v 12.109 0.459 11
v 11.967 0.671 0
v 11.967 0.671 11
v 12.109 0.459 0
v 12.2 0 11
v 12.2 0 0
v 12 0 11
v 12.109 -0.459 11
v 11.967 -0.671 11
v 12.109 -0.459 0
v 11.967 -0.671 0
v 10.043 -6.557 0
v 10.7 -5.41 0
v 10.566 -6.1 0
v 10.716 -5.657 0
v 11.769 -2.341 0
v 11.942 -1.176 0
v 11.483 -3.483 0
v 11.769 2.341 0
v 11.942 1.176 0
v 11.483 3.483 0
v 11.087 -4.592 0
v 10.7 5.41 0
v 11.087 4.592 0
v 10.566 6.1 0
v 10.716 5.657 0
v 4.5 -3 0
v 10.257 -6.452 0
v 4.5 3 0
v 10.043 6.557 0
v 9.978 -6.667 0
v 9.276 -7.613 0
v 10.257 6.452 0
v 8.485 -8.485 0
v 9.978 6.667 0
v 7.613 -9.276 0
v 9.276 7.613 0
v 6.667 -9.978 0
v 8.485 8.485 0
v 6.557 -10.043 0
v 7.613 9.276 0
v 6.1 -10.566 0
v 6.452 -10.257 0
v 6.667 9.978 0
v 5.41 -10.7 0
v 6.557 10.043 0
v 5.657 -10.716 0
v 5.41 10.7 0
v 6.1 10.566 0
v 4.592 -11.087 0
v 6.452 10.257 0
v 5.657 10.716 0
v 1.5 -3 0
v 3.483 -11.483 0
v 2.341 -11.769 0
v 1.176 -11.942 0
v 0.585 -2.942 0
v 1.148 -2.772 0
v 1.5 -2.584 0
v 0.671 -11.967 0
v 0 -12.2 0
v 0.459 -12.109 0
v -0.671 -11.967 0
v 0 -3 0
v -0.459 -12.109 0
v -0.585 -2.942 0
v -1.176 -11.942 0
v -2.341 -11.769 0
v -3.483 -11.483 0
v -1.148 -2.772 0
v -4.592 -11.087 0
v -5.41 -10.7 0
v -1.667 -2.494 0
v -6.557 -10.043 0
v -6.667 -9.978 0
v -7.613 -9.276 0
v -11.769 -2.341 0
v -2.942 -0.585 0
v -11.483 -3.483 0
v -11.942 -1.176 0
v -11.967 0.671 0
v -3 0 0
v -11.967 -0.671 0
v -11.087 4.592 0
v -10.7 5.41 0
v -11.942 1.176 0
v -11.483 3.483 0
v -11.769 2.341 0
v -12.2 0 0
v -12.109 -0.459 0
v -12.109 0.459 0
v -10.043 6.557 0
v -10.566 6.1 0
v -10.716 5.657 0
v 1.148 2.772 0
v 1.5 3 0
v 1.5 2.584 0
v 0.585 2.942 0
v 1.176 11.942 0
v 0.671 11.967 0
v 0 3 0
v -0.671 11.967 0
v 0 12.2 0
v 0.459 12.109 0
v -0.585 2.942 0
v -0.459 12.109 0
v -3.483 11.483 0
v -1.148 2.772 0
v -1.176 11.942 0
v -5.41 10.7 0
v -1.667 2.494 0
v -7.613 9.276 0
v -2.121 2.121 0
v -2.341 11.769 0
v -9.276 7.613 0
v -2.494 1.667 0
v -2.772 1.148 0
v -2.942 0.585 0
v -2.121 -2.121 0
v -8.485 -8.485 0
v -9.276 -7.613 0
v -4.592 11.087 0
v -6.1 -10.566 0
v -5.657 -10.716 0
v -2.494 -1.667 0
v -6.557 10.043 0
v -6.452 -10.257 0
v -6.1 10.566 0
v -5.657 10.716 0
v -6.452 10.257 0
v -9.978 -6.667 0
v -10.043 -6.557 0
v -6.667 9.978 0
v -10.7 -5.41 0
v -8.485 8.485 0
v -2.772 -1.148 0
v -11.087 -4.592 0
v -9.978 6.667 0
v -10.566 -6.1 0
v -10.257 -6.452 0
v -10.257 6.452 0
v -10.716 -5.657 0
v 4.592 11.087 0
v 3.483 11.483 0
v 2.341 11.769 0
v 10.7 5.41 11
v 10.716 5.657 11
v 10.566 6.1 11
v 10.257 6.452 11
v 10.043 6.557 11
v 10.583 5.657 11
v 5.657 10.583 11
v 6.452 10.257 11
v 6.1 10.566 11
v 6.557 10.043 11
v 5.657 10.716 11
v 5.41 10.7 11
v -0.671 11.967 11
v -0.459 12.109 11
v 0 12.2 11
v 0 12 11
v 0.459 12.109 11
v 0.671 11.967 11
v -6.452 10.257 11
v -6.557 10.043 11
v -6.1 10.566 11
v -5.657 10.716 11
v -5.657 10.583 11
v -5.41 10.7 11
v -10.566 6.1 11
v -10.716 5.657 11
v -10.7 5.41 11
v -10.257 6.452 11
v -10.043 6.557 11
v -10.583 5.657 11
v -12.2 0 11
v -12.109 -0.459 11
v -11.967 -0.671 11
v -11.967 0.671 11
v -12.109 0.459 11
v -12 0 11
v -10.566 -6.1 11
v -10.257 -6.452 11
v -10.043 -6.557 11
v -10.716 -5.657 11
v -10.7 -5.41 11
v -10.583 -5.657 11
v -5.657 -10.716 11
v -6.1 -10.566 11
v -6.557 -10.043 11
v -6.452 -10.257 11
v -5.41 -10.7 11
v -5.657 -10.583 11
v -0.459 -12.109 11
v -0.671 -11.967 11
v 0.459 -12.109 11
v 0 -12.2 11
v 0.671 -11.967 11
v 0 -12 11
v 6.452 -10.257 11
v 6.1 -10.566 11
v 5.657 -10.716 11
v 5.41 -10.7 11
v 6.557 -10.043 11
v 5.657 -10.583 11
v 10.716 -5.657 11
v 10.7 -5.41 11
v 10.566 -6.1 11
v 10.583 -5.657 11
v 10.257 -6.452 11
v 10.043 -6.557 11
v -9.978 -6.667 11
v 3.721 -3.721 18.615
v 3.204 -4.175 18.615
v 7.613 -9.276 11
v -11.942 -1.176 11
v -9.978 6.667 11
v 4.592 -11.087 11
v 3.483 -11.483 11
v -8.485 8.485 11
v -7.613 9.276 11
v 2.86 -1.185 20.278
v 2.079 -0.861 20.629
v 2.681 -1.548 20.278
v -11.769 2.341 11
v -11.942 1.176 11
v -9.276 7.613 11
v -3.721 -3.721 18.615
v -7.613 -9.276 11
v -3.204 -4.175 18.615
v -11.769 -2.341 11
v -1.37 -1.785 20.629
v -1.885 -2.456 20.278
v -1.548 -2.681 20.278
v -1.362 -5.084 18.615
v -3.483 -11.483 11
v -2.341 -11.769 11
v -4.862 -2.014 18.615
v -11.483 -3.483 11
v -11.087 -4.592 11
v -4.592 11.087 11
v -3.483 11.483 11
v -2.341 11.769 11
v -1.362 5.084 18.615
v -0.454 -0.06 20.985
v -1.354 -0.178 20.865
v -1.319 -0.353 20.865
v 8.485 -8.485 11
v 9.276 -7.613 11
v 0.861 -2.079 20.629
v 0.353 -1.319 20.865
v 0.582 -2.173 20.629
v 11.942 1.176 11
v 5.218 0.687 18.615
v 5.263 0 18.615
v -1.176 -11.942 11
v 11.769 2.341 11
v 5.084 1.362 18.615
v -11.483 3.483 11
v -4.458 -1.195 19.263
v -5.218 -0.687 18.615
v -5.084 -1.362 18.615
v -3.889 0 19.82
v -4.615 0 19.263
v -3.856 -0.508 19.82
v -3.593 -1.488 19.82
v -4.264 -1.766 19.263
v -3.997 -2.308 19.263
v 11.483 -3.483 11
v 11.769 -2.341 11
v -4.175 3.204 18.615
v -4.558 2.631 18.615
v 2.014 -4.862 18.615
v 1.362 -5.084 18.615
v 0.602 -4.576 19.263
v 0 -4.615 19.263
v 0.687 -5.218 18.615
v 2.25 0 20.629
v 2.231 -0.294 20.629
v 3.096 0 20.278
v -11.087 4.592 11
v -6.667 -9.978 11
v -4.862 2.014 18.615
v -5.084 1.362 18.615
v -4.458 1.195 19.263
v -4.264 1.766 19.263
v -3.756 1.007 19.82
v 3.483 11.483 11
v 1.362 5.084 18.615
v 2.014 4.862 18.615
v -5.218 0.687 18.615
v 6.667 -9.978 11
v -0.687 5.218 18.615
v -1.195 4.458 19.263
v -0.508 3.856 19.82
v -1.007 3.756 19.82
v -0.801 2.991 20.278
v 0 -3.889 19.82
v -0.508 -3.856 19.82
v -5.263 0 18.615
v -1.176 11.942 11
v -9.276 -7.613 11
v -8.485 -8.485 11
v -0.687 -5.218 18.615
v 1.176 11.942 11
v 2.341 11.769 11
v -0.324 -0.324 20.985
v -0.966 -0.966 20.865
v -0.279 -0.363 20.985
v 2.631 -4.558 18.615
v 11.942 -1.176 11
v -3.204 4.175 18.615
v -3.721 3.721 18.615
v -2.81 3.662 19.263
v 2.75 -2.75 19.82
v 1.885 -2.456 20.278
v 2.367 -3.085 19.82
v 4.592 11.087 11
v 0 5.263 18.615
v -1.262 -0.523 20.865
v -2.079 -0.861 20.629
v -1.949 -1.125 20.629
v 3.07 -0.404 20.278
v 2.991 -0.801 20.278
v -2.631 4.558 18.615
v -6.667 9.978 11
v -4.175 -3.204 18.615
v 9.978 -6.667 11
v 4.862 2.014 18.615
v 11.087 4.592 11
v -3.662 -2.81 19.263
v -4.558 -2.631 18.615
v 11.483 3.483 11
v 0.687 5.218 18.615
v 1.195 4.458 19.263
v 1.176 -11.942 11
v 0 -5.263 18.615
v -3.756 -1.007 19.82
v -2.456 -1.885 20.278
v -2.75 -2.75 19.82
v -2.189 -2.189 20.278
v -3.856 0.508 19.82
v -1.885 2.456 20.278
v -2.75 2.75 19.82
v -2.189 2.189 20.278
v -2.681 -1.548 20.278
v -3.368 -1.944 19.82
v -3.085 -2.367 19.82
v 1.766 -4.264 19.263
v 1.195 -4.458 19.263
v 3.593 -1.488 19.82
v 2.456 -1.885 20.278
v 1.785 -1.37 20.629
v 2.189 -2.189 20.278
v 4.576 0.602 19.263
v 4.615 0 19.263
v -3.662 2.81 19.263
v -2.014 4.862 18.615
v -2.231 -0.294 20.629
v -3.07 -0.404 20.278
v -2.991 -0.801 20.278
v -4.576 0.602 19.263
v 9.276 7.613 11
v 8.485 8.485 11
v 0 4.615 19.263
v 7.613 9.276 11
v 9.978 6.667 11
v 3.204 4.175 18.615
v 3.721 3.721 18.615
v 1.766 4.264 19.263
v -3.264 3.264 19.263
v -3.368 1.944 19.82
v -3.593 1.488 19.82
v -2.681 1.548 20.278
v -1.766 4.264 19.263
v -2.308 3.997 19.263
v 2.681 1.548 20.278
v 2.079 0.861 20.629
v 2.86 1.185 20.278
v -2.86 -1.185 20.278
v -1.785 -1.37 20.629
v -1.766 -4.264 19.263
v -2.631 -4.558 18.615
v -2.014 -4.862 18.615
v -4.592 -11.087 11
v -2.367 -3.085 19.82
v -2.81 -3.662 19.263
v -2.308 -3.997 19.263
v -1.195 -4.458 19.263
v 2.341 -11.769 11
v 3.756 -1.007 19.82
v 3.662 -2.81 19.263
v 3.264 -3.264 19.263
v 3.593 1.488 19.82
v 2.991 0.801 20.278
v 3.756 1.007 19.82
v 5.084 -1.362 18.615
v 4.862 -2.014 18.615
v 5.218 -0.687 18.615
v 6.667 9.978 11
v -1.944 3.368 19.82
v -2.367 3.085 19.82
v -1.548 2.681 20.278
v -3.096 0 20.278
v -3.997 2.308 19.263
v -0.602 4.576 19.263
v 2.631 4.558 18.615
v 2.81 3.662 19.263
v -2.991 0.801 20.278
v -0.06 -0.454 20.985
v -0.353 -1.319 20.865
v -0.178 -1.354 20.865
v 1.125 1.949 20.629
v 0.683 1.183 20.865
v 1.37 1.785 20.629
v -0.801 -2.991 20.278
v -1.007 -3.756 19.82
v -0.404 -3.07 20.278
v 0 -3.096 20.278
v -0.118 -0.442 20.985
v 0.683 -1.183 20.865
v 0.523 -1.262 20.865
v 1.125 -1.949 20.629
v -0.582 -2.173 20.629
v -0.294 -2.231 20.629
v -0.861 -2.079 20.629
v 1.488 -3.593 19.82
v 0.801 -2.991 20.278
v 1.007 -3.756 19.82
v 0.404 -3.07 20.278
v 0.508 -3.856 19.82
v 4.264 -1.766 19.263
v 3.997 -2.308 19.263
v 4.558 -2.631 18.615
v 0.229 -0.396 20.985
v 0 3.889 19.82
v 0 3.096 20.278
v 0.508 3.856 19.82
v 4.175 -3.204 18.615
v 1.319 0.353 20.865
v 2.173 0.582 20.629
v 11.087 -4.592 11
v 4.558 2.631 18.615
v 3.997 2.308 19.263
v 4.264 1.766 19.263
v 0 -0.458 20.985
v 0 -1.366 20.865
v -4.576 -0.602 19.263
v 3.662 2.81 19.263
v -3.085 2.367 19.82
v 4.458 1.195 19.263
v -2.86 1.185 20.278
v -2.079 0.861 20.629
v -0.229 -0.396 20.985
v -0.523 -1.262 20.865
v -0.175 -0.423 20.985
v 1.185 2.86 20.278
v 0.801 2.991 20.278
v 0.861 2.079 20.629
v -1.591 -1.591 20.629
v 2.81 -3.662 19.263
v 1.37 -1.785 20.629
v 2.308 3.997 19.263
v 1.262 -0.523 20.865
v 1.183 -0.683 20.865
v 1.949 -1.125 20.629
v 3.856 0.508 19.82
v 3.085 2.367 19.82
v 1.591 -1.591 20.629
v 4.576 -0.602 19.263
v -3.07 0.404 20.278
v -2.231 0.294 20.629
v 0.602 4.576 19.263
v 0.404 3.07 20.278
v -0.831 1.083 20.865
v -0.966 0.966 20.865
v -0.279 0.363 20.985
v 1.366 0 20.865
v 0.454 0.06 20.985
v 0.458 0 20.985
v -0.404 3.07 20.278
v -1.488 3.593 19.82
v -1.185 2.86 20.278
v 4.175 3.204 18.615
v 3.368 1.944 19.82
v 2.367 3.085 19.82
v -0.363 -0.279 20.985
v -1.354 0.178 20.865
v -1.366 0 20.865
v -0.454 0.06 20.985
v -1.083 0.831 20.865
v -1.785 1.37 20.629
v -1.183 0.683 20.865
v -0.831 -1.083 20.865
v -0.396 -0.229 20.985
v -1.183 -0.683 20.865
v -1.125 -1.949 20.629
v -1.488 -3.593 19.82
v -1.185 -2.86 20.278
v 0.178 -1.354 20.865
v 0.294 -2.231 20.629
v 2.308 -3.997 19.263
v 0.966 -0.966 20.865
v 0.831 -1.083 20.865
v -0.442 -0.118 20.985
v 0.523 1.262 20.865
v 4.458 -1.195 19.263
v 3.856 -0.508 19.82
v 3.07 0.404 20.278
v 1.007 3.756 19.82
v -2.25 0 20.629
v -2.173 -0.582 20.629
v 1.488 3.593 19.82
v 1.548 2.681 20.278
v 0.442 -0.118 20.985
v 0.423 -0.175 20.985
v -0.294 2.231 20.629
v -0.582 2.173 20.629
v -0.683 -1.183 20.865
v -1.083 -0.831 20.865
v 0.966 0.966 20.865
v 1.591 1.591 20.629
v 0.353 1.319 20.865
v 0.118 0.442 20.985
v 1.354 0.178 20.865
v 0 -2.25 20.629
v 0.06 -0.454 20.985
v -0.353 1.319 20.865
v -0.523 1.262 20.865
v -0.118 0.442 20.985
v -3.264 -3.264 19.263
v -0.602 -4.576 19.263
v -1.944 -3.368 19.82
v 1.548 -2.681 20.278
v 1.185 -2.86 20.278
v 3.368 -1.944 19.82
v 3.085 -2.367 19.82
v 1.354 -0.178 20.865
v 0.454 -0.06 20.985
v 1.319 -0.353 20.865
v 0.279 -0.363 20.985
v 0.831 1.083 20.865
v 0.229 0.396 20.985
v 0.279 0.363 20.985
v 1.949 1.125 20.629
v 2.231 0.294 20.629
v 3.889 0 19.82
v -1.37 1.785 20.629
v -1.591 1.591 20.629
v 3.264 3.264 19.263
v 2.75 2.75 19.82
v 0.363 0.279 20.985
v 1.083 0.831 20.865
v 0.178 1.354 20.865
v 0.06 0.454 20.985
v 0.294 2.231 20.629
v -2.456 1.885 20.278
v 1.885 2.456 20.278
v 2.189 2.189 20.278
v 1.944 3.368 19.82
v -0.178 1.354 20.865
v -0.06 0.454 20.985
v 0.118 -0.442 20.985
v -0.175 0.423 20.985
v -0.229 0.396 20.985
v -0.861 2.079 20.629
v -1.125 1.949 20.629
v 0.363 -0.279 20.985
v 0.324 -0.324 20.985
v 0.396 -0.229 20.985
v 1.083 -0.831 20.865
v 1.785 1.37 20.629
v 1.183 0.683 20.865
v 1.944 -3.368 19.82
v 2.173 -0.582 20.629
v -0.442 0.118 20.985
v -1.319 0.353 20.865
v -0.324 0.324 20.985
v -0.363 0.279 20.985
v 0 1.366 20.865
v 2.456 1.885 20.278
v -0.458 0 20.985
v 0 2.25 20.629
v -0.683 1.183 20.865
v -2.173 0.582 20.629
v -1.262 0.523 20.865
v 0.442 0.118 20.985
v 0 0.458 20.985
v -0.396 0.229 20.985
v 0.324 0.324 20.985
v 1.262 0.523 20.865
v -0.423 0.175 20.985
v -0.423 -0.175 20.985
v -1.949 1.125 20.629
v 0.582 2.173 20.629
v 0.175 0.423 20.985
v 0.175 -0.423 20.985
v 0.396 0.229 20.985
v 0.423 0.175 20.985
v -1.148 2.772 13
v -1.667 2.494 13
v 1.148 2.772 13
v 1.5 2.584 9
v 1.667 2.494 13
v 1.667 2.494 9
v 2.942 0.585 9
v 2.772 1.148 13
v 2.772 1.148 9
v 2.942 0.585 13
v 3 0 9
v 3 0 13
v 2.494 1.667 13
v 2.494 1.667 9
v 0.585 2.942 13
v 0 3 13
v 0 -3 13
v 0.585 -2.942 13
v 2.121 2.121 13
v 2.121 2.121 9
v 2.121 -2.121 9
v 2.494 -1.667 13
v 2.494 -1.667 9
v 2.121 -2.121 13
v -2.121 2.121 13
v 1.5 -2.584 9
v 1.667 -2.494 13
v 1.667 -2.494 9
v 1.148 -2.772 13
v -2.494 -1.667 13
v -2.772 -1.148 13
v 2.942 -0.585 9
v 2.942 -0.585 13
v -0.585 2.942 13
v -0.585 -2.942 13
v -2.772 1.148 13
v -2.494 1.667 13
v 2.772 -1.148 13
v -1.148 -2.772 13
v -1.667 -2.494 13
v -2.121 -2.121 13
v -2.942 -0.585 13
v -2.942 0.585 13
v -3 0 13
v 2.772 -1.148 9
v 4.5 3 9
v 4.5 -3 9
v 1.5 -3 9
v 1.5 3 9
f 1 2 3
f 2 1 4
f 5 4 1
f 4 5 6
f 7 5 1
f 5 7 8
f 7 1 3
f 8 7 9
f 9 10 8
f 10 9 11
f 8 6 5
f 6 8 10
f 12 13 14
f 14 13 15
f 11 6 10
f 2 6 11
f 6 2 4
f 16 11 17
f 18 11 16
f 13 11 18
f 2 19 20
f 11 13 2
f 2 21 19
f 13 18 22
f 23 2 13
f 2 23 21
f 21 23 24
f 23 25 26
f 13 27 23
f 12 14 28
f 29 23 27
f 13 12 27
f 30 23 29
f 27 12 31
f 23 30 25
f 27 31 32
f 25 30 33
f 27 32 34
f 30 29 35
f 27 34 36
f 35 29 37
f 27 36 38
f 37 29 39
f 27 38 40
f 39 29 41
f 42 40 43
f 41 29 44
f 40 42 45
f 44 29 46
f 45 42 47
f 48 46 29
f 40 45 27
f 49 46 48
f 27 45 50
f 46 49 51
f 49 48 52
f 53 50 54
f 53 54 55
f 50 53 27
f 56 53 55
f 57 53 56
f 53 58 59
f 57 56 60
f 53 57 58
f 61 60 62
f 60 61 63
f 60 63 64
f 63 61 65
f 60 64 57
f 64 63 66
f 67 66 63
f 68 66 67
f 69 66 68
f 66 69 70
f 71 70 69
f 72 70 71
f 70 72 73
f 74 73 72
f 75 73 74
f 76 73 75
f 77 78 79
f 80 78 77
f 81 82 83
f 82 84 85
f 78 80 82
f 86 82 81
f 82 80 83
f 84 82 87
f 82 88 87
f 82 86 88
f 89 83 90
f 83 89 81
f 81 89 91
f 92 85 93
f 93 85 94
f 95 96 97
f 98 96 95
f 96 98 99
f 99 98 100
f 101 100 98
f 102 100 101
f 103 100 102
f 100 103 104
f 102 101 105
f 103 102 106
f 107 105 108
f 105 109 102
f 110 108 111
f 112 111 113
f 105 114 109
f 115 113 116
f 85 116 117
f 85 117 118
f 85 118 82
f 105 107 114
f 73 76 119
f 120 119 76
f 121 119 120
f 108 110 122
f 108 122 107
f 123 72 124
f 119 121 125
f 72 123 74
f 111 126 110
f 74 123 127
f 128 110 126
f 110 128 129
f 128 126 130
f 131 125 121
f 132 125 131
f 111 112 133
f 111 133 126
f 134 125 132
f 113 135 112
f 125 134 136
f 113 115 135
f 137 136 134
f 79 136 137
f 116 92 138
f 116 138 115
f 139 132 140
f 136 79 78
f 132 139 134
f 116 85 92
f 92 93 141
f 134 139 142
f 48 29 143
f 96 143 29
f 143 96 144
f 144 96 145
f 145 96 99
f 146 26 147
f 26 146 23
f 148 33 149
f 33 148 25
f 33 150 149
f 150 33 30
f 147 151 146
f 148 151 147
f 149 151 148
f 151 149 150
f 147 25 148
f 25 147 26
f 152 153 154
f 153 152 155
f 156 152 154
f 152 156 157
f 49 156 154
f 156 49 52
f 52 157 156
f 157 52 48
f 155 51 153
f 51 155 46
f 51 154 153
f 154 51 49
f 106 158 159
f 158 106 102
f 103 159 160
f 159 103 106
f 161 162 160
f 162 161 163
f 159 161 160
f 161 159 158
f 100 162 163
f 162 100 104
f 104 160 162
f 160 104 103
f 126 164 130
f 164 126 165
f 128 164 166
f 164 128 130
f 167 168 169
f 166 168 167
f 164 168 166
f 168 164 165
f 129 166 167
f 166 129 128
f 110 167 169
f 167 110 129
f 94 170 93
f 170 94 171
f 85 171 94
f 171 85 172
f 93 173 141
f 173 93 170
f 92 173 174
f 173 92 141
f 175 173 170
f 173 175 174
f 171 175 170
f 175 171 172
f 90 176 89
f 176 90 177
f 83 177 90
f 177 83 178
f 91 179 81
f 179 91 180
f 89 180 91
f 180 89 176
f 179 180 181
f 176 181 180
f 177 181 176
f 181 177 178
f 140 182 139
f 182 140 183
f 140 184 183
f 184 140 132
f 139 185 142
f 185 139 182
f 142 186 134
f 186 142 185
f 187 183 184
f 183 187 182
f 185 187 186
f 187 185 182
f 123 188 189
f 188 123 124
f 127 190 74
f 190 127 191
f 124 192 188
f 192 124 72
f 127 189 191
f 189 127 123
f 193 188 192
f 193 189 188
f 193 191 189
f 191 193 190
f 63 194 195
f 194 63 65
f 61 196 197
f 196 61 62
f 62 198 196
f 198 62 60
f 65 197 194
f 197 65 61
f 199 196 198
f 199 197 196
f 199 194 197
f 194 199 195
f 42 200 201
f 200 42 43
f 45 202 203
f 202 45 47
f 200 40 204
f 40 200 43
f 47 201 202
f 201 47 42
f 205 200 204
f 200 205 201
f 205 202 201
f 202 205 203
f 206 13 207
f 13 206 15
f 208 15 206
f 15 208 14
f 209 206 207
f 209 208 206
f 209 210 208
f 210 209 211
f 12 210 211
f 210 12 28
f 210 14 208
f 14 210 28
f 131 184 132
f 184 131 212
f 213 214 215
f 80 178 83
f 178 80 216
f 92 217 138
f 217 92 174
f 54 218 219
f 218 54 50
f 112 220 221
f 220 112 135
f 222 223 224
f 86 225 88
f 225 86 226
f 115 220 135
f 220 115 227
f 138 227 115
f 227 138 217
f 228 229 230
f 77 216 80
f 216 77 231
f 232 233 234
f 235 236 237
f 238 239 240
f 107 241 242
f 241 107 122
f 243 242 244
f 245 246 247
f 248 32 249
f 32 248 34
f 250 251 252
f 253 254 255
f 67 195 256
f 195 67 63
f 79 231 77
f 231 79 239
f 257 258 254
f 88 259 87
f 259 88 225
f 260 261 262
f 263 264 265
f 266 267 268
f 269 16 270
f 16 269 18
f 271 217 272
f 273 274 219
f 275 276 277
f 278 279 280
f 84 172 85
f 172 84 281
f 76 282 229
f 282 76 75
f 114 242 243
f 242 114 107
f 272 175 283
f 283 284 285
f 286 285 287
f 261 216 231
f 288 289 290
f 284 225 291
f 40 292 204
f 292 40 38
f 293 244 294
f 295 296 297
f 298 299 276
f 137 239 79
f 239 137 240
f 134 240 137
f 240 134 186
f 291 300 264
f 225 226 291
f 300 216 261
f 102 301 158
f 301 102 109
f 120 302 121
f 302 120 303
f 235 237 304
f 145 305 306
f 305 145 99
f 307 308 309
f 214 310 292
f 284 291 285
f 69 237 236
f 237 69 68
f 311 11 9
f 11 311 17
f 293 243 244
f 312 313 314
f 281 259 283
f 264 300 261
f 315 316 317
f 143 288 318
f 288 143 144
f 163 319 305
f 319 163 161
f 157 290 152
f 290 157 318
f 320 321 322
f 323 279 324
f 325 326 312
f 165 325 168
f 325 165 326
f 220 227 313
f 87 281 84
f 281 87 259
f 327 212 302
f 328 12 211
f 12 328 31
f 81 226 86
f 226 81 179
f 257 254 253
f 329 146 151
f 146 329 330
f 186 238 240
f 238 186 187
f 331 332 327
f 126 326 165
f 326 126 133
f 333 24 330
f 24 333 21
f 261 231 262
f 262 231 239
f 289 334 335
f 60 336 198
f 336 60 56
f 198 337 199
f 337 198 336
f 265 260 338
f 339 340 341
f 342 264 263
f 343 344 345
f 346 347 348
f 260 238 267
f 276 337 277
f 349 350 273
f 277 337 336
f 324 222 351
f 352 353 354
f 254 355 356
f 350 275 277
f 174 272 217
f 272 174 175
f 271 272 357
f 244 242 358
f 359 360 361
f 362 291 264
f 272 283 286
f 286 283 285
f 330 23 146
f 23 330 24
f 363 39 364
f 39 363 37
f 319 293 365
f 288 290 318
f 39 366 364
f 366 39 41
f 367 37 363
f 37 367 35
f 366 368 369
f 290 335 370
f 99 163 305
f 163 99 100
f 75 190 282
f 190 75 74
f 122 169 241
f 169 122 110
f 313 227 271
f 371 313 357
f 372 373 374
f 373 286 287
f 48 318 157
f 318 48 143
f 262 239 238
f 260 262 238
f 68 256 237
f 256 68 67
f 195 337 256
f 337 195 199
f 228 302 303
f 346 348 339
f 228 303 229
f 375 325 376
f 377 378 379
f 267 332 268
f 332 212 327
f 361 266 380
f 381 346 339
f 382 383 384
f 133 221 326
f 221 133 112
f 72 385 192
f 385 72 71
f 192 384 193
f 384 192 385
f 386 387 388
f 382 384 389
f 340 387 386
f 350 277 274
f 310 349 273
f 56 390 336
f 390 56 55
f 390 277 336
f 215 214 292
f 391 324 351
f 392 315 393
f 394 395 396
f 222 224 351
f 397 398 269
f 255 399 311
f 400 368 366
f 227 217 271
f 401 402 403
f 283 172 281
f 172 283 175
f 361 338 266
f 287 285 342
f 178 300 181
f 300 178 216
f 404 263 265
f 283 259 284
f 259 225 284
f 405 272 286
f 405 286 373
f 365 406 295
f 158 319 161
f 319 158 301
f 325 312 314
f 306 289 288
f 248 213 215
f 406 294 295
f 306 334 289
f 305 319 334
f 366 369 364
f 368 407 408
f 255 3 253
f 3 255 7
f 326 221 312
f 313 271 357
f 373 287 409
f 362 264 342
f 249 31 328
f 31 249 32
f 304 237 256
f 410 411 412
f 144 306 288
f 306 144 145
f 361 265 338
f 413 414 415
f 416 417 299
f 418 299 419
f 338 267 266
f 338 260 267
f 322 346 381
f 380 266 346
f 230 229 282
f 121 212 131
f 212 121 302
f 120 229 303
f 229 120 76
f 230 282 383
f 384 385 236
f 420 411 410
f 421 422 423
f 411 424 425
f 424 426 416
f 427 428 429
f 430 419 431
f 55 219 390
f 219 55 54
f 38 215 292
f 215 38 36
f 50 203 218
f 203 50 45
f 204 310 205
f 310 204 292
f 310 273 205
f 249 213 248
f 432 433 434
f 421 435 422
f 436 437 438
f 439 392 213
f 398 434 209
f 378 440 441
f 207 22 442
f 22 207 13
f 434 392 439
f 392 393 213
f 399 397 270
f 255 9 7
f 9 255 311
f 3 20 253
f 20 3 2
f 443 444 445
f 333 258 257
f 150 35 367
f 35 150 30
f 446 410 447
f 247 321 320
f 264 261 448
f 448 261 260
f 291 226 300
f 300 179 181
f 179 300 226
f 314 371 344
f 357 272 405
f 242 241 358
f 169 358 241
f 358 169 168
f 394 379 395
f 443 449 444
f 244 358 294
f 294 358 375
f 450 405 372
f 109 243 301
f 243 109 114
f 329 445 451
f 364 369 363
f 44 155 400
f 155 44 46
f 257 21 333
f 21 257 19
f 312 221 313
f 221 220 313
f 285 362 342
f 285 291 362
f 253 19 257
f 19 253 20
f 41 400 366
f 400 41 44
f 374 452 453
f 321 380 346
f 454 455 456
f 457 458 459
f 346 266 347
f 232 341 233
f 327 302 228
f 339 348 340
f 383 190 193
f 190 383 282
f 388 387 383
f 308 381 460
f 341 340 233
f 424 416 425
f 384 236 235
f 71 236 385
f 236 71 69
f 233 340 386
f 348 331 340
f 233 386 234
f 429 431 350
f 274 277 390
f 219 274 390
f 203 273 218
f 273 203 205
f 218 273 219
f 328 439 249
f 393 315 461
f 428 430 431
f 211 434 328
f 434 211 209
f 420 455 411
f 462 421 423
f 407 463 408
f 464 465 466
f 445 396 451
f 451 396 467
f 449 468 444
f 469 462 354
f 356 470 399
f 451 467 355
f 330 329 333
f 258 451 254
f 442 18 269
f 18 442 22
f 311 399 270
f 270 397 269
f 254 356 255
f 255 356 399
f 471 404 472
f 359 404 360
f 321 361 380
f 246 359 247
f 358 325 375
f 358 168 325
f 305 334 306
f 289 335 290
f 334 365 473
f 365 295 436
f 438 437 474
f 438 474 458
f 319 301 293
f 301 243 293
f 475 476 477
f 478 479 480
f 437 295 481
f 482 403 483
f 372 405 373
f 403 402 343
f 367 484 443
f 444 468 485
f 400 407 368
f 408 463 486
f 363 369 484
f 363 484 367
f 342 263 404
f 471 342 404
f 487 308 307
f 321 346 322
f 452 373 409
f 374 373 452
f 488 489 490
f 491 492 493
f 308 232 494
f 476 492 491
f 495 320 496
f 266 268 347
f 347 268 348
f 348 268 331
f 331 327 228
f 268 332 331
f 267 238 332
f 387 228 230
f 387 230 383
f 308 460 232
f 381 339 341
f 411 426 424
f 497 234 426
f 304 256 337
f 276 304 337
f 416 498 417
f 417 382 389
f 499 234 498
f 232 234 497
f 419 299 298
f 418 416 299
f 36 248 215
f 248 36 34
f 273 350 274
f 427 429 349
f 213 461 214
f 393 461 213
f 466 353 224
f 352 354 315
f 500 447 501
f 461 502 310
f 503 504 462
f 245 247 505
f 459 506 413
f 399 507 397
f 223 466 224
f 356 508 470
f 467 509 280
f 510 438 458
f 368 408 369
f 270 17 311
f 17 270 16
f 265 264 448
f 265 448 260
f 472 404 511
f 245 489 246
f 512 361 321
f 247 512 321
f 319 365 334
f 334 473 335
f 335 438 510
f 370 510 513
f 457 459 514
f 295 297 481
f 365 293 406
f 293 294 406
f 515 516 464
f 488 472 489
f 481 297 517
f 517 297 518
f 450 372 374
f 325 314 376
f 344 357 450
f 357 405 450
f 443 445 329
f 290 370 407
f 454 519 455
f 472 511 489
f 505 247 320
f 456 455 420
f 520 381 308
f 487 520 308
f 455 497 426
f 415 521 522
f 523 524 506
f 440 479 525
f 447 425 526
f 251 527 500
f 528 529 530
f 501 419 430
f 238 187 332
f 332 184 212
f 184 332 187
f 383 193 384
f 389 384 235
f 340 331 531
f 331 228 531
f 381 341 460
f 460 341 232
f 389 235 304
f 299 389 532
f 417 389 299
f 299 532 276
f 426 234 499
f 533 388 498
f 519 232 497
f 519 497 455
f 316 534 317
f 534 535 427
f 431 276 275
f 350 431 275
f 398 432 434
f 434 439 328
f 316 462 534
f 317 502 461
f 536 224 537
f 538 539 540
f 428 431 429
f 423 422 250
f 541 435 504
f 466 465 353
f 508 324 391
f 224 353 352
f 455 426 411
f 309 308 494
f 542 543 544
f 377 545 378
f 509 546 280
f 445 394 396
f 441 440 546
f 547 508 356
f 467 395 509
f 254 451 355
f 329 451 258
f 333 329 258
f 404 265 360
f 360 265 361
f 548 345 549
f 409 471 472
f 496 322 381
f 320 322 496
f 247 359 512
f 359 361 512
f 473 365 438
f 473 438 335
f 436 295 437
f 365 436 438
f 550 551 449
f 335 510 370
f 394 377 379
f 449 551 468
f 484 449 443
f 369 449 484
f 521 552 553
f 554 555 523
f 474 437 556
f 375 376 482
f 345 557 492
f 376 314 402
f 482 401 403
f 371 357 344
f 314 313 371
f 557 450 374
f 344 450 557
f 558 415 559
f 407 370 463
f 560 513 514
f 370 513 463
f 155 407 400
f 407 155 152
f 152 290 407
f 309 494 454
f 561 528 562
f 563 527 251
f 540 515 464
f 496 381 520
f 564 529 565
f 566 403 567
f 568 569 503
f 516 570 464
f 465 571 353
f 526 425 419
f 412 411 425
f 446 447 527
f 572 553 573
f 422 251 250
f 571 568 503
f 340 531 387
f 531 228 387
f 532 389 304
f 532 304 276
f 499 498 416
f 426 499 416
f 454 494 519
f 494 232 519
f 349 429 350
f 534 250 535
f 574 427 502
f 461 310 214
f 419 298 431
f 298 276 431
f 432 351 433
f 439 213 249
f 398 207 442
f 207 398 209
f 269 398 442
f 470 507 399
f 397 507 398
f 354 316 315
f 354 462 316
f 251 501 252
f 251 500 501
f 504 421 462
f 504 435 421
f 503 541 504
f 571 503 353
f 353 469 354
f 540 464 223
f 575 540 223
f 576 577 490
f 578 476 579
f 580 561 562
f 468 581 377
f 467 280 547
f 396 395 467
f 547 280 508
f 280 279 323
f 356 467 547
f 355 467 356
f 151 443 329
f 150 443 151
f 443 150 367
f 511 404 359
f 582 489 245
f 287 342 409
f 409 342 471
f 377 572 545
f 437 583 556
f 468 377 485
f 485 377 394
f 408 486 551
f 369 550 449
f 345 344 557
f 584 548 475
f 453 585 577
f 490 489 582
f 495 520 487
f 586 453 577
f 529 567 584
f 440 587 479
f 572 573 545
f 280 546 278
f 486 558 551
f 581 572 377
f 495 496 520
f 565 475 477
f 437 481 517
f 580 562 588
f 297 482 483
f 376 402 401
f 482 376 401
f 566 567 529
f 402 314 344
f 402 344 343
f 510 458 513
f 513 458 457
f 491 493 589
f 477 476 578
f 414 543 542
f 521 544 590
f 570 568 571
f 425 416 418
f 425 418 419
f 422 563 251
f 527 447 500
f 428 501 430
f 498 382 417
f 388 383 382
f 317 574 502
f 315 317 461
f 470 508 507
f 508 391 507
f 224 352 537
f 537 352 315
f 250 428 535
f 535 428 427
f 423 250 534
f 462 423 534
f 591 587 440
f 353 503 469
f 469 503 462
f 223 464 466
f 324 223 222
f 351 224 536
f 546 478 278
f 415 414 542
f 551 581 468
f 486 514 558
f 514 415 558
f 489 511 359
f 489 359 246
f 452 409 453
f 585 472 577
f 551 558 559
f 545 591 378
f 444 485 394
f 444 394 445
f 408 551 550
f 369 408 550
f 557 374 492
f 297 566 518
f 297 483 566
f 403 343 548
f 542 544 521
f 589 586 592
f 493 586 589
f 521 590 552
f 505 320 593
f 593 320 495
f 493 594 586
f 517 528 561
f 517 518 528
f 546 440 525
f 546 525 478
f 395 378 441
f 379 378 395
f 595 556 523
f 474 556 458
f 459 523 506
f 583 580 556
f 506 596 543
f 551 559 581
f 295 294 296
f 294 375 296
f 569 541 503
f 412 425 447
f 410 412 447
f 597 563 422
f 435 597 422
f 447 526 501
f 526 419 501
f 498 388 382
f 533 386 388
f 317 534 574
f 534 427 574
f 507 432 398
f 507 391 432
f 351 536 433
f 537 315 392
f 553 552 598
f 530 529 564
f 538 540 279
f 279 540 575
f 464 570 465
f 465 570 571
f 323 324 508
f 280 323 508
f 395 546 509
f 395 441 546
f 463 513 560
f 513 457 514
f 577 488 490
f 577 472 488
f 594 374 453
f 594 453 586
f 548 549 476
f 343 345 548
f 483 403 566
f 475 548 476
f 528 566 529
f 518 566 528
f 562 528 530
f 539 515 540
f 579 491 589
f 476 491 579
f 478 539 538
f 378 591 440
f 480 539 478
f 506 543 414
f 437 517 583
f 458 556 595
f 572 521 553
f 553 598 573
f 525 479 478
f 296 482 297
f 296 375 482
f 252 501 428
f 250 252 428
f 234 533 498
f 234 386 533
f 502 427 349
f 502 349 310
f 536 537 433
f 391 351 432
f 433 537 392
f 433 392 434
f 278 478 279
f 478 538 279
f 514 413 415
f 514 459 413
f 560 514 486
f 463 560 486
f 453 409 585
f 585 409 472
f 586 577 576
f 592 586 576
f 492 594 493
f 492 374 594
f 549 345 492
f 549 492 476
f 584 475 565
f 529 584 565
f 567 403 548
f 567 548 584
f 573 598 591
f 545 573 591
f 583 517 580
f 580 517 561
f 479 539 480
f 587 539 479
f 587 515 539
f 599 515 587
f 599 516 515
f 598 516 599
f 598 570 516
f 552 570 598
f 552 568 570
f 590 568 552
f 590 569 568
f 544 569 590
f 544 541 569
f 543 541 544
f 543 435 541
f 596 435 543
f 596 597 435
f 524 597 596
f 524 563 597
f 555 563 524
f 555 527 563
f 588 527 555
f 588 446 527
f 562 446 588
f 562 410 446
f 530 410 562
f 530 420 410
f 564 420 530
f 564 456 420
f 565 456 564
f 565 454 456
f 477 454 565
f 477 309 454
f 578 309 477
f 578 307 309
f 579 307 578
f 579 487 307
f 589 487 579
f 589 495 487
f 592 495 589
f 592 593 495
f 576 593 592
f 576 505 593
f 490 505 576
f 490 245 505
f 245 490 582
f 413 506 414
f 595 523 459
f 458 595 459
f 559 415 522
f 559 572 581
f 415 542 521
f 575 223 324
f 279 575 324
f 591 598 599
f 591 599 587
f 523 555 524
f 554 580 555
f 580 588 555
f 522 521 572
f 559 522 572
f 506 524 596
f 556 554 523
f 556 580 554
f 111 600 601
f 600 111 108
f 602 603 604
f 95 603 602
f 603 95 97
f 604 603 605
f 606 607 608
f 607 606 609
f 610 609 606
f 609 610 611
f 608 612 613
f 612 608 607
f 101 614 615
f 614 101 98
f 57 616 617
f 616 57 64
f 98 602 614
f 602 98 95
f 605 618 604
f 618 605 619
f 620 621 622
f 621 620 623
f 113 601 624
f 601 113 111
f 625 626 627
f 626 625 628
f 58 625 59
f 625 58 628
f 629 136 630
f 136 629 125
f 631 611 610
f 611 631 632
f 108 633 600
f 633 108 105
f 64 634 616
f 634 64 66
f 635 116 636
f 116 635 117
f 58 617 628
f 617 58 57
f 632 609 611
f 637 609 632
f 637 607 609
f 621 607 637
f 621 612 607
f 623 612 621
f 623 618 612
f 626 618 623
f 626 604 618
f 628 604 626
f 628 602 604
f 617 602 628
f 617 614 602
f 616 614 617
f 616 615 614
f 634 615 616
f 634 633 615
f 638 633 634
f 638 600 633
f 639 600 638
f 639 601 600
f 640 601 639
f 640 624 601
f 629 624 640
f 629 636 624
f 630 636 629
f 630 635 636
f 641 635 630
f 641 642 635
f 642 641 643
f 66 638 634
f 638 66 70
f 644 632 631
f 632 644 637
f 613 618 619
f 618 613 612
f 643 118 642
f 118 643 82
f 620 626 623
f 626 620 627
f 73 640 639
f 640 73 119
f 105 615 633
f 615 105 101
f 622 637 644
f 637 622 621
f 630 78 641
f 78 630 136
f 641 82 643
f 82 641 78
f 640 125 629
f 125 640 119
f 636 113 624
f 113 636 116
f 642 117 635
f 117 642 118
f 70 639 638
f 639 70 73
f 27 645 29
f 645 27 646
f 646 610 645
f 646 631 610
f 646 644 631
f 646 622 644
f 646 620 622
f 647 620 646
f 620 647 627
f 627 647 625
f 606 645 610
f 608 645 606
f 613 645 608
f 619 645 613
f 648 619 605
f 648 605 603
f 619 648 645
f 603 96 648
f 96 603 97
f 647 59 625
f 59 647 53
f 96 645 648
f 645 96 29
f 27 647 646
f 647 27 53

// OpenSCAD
// Real part: a control knob — a rounded body (hull of cylinders) with a
// D-shaft bore and finger grips.
// Constructs: hull, difference, union, for-loop, rotate, cylinder, cube, sphere.
body_r = 12;
body_h = 14;
shaft_r = 3;
grips = 12;

module rounded_body() {
    hull() {
        cylinder(h = body_h - 3, r = body_r, $fn = 64);
        translate([0, 0, body_h - 3]) cylinder(h = 0.1, r = body_r - 3, $fn = 64);
        translate([0, 0, body_h]) sphere(r = body_r - 5, $fn = 48);
    }
}

difference() {
    union() {
        rounded_body();
        // Finger grip ribs around the circumference.
        for (a = [0 : 360 / grips : 359]) {
            rotate([0, 0, a])
                translate([body_r - 1, 0, 0])
                    cylinder(h = body_h - 3, r = 1.2, $fn = 16);
        }
    }
    // D-shaped shaft bore.
    translate([0, 0, -1]) {
        cylinder(h = body_h, r = shaft_r, $fn = 32);
        translate([1.5, -shaft_r, 0]) cube([shaft_r, shaft_r * 2, body_h - 4]);
    }
}
